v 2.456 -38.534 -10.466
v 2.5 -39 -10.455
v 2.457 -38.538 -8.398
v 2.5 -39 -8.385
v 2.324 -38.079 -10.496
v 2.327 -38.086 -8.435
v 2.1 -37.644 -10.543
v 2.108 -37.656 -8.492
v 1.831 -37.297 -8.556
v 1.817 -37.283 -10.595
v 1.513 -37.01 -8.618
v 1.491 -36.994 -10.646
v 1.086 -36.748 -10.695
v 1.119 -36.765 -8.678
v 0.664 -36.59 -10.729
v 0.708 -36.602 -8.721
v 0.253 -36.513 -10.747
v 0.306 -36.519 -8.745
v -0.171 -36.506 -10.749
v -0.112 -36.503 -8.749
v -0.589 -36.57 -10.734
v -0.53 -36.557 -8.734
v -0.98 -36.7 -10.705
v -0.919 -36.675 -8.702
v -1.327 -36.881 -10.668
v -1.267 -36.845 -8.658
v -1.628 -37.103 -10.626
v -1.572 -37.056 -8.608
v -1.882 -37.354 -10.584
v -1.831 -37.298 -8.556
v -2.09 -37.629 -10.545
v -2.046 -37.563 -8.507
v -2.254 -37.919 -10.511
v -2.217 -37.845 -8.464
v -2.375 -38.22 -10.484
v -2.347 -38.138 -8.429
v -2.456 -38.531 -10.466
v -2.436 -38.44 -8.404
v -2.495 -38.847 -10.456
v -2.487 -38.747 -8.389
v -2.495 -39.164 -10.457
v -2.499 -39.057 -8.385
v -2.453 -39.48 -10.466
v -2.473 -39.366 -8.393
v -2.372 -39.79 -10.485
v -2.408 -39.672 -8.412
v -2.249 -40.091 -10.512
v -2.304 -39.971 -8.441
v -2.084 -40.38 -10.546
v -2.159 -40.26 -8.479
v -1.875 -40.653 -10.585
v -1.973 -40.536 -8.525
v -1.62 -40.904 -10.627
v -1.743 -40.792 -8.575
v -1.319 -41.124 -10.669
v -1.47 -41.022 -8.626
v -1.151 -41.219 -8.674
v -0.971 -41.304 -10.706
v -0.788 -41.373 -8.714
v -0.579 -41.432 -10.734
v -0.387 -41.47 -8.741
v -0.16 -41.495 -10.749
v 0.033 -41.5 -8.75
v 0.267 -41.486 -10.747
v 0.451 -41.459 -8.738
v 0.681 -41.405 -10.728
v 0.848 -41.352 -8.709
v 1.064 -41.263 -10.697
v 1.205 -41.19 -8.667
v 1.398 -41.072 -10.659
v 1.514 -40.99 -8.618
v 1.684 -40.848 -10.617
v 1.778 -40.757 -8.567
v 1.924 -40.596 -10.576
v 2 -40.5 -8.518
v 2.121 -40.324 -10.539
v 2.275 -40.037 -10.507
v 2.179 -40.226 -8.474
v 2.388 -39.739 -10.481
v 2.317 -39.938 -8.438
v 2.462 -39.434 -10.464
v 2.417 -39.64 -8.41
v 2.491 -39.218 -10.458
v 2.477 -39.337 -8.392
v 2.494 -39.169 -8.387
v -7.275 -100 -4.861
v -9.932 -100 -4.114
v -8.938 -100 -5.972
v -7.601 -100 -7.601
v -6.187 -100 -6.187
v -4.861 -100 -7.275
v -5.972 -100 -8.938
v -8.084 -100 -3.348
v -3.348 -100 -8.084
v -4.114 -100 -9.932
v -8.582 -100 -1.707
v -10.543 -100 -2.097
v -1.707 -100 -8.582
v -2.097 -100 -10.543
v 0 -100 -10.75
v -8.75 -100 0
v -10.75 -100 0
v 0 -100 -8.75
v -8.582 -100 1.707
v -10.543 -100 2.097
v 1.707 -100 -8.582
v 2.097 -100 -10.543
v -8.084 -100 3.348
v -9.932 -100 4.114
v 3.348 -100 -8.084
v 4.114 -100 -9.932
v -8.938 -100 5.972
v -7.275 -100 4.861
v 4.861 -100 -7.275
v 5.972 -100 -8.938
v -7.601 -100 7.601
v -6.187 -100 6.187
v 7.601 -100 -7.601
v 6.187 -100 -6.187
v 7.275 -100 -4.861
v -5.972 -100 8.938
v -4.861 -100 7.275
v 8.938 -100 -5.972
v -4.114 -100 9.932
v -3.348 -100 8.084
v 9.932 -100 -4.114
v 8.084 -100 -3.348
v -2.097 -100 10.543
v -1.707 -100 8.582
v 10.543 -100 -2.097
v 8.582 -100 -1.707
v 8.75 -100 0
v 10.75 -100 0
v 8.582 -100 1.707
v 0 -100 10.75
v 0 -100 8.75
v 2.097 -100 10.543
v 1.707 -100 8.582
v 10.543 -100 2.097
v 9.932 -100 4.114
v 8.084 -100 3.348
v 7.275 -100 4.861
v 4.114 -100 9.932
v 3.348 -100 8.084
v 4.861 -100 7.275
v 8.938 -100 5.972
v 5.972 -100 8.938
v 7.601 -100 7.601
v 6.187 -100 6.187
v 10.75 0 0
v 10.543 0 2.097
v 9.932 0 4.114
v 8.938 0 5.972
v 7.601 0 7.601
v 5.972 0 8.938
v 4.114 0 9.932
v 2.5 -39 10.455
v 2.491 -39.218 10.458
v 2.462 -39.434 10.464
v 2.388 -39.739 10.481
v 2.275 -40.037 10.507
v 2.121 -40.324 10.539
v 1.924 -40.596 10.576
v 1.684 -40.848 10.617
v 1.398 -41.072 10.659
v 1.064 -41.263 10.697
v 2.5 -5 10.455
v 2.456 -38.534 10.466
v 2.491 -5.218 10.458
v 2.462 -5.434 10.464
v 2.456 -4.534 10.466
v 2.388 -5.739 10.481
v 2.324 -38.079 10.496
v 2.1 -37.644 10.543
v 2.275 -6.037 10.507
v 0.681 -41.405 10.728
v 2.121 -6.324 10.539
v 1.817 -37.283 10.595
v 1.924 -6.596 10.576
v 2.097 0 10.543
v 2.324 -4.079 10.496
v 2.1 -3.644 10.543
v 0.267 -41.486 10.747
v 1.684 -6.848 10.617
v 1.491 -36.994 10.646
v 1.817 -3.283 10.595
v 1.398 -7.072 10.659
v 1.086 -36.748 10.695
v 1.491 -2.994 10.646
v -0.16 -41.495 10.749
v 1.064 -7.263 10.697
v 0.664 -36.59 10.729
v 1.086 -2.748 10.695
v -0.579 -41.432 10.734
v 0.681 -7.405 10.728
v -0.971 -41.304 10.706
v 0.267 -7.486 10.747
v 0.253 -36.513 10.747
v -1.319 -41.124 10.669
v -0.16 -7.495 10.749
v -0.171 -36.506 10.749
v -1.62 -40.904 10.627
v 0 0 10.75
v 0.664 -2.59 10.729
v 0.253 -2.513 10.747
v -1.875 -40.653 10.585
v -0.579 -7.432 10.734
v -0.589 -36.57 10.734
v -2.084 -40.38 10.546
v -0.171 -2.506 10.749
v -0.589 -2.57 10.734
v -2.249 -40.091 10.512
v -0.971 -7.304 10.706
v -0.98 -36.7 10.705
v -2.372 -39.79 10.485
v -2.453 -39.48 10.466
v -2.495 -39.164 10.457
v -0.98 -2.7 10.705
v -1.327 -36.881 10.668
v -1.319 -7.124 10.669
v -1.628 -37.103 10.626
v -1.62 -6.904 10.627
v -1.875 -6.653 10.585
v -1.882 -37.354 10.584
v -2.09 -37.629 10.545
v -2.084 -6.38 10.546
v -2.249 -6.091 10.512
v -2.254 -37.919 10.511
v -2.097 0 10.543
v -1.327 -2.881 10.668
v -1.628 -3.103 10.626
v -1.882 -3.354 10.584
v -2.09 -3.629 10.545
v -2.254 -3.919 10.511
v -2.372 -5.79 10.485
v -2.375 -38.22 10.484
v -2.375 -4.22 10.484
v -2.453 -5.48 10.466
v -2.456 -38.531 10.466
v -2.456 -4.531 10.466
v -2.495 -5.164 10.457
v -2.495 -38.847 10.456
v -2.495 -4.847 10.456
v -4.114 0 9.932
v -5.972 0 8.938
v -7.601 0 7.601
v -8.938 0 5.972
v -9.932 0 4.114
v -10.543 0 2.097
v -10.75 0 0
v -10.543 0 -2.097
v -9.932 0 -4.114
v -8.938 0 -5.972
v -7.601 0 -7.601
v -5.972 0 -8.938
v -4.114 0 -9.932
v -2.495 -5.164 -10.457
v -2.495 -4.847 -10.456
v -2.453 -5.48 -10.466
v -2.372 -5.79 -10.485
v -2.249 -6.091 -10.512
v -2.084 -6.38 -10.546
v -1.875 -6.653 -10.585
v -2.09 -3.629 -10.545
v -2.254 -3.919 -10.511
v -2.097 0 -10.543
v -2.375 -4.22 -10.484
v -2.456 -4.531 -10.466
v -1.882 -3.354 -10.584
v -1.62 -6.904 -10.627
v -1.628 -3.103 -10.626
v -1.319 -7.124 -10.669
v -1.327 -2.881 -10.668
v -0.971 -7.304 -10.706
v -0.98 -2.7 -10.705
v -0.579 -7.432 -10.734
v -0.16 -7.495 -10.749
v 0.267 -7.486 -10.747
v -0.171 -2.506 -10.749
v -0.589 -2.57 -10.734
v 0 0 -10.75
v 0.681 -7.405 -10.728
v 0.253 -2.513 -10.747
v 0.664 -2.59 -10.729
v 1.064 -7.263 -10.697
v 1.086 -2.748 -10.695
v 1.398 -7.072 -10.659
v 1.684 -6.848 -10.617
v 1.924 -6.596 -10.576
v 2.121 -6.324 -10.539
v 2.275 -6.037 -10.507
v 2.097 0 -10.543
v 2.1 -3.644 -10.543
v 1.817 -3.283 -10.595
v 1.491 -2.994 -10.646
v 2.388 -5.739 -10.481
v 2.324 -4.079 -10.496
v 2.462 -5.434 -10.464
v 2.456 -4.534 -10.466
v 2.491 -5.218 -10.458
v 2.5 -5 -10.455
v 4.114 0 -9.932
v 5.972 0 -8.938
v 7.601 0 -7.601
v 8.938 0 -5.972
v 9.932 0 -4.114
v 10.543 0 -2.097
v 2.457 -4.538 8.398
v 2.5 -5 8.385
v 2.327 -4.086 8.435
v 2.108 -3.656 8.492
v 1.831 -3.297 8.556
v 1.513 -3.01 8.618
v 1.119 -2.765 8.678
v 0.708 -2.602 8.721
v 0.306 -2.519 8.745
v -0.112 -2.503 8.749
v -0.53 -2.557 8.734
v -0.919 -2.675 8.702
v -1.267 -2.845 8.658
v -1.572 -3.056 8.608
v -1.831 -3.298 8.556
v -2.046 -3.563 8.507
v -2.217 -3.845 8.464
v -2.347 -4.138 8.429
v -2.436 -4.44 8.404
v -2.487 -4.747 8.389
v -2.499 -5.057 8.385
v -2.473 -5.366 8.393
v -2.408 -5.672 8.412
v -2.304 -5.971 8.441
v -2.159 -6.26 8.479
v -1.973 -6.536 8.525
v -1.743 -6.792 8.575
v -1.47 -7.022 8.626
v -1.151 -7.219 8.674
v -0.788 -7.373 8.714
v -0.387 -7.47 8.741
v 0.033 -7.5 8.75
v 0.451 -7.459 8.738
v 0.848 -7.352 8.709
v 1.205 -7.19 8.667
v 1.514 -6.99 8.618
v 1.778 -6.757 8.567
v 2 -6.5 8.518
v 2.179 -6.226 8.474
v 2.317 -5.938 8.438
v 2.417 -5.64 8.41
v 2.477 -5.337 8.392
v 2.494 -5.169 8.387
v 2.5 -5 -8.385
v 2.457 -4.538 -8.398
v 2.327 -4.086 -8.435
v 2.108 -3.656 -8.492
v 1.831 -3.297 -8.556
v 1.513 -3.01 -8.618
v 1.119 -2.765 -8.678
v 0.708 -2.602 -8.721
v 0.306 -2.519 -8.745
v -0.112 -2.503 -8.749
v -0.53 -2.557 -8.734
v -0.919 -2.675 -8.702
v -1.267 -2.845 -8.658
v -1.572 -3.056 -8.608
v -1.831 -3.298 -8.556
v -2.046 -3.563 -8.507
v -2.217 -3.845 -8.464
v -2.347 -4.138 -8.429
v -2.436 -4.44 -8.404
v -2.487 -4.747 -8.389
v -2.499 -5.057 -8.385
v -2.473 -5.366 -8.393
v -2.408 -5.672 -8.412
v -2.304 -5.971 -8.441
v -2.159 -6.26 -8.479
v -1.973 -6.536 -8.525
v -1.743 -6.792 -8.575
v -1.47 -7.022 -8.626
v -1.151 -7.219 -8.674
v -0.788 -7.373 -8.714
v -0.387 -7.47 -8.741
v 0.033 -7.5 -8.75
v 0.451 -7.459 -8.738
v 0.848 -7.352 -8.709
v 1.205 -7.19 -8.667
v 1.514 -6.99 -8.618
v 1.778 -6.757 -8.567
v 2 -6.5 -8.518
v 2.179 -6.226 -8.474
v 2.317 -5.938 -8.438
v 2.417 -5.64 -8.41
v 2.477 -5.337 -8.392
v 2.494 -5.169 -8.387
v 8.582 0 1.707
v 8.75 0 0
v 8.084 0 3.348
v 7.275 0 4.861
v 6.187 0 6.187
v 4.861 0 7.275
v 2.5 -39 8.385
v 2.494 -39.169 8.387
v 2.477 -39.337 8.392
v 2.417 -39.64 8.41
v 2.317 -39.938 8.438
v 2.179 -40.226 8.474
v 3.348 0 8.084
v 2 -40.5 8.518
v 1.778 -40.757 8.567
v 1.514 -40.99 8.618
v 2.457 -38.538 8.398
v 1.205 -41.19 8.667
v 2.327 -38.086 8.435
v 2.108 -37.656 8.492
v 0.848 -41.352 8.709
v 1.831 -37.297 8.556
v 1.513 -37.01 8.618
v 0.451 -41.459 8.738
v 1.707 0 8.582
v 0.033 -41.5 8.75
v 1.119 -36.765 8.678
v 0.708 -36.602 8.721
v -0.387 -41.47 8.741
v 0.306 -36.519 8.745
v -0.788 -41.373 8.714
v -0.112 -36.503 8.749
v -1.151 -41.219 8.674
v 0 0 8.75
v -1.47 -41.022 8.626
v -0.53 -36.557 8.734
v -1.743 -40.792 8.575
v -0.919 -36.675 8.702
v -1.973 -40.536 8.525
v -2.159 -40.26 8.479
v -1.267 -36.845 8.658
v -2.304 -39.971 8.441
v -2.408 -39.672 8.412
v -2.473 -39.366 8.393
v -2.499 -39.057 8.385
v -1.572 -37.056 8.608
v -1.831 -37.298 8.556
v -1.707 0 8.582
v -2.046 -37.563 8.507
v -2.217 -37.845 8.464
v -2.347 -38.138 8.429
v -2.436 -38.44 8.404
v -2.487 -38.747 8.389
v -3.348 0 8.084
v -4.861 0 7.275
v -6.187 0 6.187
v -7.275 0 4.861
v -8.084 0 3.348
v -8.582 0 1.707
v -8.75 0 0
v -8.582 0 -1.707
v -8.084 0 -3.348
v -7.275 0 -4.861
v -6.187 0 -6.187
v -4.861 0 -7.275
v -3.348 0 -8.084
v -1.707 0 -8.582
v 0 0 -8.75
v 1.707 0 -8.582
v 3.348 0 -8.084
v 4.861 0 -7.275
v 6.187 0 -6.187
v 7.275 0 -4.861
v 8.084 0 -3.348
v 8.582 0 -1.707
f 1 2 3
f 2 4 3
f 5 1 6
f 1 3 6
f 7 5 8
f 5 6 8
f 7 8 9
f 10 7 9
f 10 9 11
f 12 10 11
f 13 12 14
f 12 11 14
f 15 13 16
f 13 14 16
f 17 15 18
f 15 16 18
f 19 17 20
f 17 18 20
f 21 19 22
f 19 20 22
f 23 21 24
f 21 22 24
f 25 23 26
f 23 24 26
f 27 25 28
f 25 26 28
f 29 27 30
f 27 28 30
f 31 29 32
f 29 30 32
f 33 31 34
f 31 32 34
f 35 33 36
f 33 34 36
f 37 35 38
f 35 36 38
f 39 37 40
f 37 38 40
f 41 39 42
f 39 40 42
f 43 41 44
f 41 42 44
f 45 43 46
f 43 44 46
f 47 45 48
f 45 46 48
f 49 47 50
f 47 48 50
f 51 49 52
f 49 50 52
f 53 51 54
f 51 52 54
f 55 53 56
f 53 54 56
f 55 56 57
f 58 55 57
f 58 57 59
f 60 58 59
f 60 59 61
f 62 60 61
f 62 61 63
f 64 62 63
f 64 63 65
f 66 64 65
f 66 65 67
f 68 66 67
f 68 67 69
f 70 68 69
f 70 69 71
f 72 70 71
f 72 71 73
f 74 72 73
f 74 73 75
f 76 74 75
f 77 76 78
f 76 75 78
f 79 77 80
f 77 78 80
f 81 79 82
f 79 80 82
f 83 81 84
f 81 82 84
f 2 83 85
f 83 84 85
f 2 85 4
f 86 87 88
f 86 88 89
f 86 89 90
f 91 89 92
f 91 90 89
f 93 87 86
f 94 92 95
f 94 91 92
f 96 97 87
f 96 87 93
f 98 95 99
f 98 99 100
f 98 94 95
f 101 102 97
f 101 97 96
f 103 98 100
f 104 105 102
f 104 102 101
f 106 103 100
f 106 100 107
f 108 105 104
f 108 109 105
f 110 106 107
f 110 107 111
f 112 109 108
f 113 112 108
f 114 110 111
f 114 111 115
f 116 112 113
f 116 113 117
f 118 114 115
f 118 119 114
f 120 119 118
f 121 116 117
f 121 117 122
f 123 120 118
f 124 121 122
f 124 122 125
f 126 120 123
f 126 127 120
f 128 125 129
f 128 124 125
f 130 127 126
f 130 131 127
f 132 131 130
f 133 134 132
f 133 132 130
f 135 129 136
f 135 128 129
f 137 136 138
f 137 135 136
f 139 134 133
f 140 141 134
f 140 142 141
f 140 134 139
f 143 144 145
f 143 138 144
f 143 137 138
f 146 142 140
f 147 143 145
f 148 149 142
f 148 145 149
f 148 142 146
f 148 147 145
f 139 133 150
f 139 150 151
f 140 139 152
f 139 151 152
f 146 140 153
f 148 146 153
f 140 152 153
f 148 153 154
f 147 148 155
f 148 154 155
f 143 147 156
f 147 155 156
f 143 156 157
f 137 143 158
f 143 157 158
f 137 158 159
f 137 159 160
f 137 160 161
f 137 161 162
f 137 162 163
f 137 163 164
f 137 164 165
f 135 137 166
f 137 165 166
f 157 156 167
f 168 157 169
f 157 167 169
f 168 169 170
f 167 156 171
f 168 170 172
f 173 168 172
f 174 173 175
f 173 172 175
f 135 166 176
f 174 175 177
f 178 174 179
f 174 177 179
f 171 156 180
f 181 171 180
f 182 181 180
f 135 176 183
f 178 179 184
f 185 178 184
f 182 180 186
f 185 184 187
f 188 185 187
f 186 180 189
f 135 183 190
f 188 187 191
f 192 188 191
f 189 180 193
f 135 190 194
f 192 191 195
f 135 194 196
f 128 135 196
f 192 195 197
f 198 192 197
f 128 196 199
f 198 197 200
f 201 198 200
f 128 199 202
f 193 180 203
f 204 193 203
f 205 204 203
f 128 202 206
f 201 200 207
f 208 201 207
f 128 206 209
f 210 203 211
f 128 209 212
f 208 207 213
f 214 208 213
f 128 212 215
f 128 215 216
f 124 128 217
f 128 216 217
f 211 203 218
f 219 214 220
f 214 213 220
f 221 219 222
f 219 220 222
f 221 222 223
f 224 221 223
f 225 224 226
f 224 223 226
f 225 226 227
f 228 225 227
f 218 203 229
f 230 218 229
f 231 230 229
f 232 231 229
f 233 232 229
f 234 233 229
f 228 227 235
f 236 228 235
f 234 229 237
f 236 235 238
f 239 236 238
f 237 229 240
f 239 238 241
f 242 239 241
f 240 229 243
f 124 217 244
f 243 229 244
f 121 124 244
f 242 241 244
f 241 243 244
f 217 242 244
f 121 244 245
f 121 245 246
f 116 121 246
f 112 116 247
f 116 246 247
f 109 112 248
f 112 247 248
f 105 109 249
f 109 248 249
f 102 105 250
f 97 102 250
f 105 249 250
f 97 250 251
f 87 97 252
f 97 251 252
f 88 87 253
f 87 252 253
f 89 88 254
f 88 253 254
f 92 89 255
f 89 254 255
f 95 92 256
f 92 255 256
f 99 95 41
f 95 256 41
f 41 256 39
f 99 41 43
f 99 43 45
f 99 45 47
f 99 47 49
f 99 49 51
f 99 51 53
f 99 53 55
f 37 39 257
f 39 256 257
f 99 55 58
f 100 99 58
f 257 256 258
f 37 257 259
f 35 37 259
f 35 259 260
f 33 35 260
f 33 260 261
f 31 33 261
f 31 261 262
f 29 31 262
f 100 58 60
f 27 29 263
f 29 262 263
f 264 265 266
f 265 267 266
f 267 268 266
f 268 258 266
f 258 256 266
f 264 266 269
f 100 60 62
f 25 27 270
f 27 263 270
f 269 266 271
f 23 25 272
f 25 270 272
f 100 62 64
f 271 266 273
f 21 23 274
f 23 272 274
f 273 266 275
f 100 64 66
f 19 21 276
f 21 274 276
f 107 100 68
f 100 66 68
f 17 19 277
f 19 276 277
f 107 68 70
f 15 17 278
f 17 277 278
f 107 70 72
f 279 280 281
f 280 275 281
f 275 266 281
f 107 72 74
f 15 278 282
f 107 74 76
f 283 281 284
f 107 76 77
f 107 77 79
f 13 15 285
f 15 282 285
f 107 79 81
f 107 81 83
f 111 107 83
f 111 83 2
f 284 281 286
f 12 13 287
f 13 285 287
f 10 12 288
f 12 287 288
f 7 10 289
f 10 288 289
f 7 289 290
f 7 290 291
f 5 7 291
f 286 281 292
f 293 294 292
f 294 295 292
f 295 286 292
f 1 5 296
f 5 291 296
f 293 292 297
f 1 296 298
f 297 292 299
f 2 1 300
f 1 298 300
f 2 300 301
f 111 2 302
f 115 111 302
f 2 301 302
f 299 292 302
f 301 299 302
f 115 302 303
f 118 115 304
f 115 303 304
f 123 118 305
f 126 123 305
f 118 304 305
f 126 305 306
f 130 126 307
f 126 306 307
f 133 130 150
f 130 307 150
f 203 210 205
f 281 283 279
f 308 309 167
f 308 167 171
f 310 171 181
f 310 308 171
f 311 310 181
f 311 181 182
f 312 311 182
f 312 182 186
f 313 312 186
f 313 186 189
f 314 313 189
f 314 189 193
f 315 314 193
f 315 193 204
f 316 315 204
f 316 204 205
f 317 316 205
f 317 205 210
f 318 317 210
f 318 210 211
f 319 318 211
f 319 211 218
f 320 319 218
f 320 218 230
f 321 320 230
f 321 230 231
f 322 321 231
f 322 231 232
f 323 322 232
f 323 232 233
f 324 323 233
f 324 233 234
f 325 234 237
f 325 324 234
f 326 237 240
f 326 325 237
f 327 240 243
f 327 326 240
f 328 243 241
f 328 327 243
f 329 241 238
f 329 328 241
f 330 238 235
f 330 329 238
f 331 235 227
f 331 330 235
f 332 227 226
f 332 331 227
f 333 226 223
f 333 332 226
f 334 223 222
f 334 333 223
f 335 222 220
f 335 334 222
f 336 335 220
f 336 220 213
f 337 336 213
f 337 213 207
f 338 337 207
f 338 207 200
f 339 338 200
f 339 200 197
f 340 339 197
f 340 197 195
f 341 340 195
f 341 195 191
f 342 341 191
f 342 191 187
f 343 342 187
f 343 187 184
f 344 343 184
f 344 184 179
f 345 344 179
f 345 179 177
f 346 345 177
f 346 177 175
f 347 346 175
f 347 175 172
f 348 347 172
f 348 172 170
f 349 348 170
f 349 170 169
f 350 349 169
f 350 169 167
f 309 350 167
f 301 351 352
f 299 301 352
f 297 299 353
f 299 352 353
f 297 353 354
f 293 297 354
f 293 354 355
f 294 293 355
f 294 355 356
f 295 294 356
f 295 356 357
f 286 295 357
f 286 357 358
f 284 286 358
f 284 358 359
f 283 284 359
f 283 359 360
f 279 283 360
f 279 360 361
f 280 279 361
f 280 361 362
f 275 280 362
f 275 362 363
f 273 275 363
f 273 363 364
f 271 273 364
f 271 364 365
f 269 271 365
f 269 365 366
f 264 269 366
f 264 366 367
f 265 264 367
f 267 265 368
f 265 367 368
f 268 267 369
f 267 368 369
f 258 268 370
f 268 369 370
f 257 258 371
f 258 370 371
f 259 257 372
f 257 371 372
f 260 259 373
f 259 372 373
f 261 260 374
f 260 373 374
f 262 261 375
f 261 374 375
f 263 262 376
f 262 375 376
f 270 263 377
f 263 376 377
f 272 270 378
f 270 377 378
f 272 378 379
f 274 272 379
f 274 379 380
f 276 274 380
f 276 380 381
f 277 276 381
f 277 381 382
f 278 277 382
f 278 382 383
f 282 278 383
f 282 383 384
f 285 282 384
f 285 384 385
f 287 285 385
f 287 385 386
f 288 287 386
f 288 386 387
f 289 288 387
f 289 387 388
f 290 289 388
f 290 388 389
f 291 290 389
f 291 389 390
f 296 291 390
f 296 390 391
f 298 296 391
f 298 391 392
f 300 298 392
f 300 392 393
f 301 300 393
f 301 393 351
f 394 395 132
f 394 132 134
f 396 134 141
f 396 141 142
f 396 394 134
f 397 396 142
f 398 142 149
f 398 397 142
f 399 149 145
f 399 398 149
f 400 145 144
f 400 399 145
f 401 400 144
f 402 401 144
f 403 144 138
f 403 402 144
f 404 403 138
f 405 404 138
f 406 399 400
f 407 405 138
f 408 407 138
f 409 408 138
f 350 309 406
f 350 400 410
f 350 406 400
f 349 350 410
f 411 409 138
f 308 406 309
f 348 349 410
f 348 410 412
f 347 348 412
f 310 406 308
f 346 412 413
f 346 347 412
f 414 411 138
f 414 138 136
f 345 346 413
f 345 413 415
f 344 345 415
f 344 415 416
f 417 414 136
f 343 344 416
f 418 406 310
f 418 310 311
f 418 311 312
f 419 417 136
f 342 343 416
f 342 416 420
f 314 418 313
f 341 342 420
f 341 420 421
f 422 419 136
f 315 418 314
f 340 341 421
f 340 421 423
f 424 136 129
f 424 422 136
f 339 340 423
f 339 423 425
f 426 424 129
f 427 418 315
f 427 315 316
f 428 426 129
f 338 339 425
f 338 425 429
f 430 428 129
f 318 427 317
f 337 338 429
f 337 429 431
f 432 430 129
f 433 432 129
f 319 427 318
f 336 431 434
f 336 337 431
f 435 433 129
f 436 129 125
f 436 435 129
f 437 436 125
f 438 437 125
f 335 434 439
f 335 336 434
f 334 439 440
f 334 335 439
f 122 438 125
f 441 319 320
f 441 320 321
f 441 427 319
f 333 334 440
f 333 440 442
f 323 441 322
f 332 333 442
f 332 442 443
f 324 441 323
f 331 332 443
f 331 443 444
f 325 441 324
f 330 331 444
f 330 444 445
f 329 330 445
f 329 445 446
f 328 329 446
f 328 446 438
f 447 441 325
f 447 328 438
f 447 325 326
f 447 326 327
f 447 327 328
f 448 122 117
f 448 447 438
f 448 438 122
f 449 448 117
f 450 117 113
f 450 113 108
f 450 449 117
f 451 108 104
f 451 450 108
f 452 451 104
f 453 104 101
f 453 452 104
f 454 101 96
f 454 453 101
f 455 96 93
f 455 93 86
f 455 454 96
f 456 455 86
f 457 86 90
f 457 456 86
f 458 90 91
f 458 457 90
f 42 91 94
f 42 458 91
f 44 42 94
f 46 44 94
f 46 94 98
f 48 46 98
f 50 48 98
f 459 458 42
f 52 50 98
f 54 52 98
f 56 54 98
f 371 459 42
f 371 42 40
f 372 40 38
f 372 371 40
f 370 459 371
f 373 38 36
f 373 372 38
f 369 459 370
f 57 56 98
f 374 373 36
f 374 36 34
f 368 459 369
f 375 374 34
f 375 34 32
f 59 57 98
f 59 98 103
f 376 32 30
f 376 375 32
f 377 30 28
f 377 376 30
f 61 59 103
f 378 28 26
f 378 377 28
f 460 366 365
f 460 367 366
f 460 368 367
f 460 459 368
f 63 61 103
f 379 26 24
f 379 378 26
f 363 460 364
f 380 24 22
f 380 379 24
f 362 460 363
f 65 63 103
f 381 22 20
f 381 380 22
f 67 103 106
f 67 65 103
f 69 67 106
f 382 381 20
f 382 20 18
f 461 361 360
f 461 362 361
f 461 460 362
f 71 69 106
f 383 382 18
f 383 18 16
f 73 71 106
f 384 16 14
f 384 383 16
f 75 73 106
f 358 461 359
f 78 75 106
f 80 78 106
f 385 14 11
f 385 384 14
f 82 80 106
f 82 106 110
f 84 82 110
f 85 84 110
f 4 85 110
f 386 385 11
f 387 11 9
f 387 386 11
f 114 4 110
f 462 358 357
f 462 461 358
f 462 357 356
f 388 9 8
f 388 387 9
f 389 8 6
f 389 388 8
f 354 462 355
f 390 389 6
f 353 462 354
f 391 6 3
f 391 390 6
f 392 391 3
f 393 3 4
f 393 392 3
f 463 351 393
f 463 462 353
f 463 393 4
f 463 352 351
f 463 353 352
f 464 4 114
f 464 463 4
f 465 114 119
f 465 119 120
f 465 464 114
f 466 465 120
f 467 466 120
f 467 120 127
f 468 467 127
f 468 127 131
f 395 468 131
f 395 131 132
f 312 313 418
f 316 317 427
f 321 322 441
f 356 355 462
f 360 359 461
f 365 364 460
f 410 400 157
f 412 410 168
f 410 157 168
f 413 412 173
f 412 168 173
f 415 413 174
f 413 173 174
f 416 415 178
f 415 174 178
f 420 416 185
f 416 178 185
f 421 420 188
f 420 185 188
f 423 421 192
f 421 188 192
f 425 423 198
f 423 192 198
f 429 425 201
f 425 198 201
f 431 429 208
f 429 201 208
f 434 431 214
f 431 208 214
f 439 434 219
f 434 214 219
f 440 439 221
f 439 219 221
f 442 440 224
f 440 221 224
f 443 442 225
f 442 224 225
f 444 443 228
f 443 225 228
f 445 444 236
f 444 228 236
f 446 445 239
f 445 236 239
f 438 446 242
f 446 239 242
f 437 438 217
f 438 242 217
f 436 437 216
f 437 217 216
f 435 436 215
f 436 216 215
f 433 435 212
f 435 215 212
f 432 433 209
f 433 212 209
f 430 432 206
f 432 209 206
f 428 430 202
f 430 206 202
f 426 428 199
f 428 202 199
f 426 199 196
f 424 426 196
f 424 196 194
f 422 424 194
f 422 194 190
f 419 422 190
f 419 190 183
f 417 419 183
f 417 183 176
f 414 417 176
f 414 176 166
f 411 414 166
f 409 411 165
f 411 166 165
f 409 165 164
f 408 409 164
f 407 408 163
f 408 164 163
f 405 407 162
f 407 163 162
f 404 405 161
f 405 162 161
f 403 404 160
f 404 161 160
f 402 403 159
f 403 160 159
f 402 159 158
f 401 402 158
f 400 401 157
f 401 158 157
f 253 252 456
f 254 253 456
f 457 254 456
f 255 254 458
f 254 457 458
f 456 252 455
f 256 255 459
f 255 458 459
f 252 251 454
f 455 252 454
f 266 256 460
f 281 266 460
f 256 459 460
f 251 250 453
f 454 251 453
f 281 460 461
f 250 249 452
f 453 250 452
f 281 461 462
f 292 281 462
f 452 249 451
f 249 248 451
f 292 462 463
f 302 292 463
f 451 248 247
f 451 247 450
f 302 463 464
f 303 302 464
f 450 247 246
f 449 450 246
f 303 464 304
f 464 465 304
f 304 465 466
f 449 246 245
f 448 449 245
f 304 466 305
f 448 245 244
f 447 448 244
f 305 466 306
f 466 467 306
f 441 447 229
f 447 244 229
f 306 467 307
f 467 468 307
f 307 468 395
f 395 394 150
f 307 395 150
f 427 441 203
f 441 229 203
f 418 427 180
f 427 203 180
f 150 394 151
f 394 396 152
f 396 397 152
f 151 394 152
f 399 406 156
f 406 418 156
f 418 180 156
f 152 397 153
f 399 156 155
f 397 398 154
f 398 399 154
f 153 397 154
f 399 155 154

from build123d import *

# Parameters (mm, degrees)
F0_R     = 10.75
F0_R_2   = 8.75
F1_DEPTH = 100
F2_R     = 2.5
F3_DEPTH = 25


with BuildPart() as f1:
    # F0 (on Front) → F1 (new body)
    with BuildSketch(Plane.XZ):
        Circle(F0_R)
        Circle(F0_R_2, mode=Mode.SUBTRACT)
    extrude(amount=F1_DEPTH)

    # F2 (on Top) → F3 (cut, symmetric)
    with BuildSketch(Plane.XY):
        with Locations((0, -5)):
            Circle(F2_R)
        with Locations((0, -39)):
            Circle(F2_R)
    extrude(amount=F3_DEPTH, both=True, mode=Mode.SUBTRACT)


solid = f1.part
